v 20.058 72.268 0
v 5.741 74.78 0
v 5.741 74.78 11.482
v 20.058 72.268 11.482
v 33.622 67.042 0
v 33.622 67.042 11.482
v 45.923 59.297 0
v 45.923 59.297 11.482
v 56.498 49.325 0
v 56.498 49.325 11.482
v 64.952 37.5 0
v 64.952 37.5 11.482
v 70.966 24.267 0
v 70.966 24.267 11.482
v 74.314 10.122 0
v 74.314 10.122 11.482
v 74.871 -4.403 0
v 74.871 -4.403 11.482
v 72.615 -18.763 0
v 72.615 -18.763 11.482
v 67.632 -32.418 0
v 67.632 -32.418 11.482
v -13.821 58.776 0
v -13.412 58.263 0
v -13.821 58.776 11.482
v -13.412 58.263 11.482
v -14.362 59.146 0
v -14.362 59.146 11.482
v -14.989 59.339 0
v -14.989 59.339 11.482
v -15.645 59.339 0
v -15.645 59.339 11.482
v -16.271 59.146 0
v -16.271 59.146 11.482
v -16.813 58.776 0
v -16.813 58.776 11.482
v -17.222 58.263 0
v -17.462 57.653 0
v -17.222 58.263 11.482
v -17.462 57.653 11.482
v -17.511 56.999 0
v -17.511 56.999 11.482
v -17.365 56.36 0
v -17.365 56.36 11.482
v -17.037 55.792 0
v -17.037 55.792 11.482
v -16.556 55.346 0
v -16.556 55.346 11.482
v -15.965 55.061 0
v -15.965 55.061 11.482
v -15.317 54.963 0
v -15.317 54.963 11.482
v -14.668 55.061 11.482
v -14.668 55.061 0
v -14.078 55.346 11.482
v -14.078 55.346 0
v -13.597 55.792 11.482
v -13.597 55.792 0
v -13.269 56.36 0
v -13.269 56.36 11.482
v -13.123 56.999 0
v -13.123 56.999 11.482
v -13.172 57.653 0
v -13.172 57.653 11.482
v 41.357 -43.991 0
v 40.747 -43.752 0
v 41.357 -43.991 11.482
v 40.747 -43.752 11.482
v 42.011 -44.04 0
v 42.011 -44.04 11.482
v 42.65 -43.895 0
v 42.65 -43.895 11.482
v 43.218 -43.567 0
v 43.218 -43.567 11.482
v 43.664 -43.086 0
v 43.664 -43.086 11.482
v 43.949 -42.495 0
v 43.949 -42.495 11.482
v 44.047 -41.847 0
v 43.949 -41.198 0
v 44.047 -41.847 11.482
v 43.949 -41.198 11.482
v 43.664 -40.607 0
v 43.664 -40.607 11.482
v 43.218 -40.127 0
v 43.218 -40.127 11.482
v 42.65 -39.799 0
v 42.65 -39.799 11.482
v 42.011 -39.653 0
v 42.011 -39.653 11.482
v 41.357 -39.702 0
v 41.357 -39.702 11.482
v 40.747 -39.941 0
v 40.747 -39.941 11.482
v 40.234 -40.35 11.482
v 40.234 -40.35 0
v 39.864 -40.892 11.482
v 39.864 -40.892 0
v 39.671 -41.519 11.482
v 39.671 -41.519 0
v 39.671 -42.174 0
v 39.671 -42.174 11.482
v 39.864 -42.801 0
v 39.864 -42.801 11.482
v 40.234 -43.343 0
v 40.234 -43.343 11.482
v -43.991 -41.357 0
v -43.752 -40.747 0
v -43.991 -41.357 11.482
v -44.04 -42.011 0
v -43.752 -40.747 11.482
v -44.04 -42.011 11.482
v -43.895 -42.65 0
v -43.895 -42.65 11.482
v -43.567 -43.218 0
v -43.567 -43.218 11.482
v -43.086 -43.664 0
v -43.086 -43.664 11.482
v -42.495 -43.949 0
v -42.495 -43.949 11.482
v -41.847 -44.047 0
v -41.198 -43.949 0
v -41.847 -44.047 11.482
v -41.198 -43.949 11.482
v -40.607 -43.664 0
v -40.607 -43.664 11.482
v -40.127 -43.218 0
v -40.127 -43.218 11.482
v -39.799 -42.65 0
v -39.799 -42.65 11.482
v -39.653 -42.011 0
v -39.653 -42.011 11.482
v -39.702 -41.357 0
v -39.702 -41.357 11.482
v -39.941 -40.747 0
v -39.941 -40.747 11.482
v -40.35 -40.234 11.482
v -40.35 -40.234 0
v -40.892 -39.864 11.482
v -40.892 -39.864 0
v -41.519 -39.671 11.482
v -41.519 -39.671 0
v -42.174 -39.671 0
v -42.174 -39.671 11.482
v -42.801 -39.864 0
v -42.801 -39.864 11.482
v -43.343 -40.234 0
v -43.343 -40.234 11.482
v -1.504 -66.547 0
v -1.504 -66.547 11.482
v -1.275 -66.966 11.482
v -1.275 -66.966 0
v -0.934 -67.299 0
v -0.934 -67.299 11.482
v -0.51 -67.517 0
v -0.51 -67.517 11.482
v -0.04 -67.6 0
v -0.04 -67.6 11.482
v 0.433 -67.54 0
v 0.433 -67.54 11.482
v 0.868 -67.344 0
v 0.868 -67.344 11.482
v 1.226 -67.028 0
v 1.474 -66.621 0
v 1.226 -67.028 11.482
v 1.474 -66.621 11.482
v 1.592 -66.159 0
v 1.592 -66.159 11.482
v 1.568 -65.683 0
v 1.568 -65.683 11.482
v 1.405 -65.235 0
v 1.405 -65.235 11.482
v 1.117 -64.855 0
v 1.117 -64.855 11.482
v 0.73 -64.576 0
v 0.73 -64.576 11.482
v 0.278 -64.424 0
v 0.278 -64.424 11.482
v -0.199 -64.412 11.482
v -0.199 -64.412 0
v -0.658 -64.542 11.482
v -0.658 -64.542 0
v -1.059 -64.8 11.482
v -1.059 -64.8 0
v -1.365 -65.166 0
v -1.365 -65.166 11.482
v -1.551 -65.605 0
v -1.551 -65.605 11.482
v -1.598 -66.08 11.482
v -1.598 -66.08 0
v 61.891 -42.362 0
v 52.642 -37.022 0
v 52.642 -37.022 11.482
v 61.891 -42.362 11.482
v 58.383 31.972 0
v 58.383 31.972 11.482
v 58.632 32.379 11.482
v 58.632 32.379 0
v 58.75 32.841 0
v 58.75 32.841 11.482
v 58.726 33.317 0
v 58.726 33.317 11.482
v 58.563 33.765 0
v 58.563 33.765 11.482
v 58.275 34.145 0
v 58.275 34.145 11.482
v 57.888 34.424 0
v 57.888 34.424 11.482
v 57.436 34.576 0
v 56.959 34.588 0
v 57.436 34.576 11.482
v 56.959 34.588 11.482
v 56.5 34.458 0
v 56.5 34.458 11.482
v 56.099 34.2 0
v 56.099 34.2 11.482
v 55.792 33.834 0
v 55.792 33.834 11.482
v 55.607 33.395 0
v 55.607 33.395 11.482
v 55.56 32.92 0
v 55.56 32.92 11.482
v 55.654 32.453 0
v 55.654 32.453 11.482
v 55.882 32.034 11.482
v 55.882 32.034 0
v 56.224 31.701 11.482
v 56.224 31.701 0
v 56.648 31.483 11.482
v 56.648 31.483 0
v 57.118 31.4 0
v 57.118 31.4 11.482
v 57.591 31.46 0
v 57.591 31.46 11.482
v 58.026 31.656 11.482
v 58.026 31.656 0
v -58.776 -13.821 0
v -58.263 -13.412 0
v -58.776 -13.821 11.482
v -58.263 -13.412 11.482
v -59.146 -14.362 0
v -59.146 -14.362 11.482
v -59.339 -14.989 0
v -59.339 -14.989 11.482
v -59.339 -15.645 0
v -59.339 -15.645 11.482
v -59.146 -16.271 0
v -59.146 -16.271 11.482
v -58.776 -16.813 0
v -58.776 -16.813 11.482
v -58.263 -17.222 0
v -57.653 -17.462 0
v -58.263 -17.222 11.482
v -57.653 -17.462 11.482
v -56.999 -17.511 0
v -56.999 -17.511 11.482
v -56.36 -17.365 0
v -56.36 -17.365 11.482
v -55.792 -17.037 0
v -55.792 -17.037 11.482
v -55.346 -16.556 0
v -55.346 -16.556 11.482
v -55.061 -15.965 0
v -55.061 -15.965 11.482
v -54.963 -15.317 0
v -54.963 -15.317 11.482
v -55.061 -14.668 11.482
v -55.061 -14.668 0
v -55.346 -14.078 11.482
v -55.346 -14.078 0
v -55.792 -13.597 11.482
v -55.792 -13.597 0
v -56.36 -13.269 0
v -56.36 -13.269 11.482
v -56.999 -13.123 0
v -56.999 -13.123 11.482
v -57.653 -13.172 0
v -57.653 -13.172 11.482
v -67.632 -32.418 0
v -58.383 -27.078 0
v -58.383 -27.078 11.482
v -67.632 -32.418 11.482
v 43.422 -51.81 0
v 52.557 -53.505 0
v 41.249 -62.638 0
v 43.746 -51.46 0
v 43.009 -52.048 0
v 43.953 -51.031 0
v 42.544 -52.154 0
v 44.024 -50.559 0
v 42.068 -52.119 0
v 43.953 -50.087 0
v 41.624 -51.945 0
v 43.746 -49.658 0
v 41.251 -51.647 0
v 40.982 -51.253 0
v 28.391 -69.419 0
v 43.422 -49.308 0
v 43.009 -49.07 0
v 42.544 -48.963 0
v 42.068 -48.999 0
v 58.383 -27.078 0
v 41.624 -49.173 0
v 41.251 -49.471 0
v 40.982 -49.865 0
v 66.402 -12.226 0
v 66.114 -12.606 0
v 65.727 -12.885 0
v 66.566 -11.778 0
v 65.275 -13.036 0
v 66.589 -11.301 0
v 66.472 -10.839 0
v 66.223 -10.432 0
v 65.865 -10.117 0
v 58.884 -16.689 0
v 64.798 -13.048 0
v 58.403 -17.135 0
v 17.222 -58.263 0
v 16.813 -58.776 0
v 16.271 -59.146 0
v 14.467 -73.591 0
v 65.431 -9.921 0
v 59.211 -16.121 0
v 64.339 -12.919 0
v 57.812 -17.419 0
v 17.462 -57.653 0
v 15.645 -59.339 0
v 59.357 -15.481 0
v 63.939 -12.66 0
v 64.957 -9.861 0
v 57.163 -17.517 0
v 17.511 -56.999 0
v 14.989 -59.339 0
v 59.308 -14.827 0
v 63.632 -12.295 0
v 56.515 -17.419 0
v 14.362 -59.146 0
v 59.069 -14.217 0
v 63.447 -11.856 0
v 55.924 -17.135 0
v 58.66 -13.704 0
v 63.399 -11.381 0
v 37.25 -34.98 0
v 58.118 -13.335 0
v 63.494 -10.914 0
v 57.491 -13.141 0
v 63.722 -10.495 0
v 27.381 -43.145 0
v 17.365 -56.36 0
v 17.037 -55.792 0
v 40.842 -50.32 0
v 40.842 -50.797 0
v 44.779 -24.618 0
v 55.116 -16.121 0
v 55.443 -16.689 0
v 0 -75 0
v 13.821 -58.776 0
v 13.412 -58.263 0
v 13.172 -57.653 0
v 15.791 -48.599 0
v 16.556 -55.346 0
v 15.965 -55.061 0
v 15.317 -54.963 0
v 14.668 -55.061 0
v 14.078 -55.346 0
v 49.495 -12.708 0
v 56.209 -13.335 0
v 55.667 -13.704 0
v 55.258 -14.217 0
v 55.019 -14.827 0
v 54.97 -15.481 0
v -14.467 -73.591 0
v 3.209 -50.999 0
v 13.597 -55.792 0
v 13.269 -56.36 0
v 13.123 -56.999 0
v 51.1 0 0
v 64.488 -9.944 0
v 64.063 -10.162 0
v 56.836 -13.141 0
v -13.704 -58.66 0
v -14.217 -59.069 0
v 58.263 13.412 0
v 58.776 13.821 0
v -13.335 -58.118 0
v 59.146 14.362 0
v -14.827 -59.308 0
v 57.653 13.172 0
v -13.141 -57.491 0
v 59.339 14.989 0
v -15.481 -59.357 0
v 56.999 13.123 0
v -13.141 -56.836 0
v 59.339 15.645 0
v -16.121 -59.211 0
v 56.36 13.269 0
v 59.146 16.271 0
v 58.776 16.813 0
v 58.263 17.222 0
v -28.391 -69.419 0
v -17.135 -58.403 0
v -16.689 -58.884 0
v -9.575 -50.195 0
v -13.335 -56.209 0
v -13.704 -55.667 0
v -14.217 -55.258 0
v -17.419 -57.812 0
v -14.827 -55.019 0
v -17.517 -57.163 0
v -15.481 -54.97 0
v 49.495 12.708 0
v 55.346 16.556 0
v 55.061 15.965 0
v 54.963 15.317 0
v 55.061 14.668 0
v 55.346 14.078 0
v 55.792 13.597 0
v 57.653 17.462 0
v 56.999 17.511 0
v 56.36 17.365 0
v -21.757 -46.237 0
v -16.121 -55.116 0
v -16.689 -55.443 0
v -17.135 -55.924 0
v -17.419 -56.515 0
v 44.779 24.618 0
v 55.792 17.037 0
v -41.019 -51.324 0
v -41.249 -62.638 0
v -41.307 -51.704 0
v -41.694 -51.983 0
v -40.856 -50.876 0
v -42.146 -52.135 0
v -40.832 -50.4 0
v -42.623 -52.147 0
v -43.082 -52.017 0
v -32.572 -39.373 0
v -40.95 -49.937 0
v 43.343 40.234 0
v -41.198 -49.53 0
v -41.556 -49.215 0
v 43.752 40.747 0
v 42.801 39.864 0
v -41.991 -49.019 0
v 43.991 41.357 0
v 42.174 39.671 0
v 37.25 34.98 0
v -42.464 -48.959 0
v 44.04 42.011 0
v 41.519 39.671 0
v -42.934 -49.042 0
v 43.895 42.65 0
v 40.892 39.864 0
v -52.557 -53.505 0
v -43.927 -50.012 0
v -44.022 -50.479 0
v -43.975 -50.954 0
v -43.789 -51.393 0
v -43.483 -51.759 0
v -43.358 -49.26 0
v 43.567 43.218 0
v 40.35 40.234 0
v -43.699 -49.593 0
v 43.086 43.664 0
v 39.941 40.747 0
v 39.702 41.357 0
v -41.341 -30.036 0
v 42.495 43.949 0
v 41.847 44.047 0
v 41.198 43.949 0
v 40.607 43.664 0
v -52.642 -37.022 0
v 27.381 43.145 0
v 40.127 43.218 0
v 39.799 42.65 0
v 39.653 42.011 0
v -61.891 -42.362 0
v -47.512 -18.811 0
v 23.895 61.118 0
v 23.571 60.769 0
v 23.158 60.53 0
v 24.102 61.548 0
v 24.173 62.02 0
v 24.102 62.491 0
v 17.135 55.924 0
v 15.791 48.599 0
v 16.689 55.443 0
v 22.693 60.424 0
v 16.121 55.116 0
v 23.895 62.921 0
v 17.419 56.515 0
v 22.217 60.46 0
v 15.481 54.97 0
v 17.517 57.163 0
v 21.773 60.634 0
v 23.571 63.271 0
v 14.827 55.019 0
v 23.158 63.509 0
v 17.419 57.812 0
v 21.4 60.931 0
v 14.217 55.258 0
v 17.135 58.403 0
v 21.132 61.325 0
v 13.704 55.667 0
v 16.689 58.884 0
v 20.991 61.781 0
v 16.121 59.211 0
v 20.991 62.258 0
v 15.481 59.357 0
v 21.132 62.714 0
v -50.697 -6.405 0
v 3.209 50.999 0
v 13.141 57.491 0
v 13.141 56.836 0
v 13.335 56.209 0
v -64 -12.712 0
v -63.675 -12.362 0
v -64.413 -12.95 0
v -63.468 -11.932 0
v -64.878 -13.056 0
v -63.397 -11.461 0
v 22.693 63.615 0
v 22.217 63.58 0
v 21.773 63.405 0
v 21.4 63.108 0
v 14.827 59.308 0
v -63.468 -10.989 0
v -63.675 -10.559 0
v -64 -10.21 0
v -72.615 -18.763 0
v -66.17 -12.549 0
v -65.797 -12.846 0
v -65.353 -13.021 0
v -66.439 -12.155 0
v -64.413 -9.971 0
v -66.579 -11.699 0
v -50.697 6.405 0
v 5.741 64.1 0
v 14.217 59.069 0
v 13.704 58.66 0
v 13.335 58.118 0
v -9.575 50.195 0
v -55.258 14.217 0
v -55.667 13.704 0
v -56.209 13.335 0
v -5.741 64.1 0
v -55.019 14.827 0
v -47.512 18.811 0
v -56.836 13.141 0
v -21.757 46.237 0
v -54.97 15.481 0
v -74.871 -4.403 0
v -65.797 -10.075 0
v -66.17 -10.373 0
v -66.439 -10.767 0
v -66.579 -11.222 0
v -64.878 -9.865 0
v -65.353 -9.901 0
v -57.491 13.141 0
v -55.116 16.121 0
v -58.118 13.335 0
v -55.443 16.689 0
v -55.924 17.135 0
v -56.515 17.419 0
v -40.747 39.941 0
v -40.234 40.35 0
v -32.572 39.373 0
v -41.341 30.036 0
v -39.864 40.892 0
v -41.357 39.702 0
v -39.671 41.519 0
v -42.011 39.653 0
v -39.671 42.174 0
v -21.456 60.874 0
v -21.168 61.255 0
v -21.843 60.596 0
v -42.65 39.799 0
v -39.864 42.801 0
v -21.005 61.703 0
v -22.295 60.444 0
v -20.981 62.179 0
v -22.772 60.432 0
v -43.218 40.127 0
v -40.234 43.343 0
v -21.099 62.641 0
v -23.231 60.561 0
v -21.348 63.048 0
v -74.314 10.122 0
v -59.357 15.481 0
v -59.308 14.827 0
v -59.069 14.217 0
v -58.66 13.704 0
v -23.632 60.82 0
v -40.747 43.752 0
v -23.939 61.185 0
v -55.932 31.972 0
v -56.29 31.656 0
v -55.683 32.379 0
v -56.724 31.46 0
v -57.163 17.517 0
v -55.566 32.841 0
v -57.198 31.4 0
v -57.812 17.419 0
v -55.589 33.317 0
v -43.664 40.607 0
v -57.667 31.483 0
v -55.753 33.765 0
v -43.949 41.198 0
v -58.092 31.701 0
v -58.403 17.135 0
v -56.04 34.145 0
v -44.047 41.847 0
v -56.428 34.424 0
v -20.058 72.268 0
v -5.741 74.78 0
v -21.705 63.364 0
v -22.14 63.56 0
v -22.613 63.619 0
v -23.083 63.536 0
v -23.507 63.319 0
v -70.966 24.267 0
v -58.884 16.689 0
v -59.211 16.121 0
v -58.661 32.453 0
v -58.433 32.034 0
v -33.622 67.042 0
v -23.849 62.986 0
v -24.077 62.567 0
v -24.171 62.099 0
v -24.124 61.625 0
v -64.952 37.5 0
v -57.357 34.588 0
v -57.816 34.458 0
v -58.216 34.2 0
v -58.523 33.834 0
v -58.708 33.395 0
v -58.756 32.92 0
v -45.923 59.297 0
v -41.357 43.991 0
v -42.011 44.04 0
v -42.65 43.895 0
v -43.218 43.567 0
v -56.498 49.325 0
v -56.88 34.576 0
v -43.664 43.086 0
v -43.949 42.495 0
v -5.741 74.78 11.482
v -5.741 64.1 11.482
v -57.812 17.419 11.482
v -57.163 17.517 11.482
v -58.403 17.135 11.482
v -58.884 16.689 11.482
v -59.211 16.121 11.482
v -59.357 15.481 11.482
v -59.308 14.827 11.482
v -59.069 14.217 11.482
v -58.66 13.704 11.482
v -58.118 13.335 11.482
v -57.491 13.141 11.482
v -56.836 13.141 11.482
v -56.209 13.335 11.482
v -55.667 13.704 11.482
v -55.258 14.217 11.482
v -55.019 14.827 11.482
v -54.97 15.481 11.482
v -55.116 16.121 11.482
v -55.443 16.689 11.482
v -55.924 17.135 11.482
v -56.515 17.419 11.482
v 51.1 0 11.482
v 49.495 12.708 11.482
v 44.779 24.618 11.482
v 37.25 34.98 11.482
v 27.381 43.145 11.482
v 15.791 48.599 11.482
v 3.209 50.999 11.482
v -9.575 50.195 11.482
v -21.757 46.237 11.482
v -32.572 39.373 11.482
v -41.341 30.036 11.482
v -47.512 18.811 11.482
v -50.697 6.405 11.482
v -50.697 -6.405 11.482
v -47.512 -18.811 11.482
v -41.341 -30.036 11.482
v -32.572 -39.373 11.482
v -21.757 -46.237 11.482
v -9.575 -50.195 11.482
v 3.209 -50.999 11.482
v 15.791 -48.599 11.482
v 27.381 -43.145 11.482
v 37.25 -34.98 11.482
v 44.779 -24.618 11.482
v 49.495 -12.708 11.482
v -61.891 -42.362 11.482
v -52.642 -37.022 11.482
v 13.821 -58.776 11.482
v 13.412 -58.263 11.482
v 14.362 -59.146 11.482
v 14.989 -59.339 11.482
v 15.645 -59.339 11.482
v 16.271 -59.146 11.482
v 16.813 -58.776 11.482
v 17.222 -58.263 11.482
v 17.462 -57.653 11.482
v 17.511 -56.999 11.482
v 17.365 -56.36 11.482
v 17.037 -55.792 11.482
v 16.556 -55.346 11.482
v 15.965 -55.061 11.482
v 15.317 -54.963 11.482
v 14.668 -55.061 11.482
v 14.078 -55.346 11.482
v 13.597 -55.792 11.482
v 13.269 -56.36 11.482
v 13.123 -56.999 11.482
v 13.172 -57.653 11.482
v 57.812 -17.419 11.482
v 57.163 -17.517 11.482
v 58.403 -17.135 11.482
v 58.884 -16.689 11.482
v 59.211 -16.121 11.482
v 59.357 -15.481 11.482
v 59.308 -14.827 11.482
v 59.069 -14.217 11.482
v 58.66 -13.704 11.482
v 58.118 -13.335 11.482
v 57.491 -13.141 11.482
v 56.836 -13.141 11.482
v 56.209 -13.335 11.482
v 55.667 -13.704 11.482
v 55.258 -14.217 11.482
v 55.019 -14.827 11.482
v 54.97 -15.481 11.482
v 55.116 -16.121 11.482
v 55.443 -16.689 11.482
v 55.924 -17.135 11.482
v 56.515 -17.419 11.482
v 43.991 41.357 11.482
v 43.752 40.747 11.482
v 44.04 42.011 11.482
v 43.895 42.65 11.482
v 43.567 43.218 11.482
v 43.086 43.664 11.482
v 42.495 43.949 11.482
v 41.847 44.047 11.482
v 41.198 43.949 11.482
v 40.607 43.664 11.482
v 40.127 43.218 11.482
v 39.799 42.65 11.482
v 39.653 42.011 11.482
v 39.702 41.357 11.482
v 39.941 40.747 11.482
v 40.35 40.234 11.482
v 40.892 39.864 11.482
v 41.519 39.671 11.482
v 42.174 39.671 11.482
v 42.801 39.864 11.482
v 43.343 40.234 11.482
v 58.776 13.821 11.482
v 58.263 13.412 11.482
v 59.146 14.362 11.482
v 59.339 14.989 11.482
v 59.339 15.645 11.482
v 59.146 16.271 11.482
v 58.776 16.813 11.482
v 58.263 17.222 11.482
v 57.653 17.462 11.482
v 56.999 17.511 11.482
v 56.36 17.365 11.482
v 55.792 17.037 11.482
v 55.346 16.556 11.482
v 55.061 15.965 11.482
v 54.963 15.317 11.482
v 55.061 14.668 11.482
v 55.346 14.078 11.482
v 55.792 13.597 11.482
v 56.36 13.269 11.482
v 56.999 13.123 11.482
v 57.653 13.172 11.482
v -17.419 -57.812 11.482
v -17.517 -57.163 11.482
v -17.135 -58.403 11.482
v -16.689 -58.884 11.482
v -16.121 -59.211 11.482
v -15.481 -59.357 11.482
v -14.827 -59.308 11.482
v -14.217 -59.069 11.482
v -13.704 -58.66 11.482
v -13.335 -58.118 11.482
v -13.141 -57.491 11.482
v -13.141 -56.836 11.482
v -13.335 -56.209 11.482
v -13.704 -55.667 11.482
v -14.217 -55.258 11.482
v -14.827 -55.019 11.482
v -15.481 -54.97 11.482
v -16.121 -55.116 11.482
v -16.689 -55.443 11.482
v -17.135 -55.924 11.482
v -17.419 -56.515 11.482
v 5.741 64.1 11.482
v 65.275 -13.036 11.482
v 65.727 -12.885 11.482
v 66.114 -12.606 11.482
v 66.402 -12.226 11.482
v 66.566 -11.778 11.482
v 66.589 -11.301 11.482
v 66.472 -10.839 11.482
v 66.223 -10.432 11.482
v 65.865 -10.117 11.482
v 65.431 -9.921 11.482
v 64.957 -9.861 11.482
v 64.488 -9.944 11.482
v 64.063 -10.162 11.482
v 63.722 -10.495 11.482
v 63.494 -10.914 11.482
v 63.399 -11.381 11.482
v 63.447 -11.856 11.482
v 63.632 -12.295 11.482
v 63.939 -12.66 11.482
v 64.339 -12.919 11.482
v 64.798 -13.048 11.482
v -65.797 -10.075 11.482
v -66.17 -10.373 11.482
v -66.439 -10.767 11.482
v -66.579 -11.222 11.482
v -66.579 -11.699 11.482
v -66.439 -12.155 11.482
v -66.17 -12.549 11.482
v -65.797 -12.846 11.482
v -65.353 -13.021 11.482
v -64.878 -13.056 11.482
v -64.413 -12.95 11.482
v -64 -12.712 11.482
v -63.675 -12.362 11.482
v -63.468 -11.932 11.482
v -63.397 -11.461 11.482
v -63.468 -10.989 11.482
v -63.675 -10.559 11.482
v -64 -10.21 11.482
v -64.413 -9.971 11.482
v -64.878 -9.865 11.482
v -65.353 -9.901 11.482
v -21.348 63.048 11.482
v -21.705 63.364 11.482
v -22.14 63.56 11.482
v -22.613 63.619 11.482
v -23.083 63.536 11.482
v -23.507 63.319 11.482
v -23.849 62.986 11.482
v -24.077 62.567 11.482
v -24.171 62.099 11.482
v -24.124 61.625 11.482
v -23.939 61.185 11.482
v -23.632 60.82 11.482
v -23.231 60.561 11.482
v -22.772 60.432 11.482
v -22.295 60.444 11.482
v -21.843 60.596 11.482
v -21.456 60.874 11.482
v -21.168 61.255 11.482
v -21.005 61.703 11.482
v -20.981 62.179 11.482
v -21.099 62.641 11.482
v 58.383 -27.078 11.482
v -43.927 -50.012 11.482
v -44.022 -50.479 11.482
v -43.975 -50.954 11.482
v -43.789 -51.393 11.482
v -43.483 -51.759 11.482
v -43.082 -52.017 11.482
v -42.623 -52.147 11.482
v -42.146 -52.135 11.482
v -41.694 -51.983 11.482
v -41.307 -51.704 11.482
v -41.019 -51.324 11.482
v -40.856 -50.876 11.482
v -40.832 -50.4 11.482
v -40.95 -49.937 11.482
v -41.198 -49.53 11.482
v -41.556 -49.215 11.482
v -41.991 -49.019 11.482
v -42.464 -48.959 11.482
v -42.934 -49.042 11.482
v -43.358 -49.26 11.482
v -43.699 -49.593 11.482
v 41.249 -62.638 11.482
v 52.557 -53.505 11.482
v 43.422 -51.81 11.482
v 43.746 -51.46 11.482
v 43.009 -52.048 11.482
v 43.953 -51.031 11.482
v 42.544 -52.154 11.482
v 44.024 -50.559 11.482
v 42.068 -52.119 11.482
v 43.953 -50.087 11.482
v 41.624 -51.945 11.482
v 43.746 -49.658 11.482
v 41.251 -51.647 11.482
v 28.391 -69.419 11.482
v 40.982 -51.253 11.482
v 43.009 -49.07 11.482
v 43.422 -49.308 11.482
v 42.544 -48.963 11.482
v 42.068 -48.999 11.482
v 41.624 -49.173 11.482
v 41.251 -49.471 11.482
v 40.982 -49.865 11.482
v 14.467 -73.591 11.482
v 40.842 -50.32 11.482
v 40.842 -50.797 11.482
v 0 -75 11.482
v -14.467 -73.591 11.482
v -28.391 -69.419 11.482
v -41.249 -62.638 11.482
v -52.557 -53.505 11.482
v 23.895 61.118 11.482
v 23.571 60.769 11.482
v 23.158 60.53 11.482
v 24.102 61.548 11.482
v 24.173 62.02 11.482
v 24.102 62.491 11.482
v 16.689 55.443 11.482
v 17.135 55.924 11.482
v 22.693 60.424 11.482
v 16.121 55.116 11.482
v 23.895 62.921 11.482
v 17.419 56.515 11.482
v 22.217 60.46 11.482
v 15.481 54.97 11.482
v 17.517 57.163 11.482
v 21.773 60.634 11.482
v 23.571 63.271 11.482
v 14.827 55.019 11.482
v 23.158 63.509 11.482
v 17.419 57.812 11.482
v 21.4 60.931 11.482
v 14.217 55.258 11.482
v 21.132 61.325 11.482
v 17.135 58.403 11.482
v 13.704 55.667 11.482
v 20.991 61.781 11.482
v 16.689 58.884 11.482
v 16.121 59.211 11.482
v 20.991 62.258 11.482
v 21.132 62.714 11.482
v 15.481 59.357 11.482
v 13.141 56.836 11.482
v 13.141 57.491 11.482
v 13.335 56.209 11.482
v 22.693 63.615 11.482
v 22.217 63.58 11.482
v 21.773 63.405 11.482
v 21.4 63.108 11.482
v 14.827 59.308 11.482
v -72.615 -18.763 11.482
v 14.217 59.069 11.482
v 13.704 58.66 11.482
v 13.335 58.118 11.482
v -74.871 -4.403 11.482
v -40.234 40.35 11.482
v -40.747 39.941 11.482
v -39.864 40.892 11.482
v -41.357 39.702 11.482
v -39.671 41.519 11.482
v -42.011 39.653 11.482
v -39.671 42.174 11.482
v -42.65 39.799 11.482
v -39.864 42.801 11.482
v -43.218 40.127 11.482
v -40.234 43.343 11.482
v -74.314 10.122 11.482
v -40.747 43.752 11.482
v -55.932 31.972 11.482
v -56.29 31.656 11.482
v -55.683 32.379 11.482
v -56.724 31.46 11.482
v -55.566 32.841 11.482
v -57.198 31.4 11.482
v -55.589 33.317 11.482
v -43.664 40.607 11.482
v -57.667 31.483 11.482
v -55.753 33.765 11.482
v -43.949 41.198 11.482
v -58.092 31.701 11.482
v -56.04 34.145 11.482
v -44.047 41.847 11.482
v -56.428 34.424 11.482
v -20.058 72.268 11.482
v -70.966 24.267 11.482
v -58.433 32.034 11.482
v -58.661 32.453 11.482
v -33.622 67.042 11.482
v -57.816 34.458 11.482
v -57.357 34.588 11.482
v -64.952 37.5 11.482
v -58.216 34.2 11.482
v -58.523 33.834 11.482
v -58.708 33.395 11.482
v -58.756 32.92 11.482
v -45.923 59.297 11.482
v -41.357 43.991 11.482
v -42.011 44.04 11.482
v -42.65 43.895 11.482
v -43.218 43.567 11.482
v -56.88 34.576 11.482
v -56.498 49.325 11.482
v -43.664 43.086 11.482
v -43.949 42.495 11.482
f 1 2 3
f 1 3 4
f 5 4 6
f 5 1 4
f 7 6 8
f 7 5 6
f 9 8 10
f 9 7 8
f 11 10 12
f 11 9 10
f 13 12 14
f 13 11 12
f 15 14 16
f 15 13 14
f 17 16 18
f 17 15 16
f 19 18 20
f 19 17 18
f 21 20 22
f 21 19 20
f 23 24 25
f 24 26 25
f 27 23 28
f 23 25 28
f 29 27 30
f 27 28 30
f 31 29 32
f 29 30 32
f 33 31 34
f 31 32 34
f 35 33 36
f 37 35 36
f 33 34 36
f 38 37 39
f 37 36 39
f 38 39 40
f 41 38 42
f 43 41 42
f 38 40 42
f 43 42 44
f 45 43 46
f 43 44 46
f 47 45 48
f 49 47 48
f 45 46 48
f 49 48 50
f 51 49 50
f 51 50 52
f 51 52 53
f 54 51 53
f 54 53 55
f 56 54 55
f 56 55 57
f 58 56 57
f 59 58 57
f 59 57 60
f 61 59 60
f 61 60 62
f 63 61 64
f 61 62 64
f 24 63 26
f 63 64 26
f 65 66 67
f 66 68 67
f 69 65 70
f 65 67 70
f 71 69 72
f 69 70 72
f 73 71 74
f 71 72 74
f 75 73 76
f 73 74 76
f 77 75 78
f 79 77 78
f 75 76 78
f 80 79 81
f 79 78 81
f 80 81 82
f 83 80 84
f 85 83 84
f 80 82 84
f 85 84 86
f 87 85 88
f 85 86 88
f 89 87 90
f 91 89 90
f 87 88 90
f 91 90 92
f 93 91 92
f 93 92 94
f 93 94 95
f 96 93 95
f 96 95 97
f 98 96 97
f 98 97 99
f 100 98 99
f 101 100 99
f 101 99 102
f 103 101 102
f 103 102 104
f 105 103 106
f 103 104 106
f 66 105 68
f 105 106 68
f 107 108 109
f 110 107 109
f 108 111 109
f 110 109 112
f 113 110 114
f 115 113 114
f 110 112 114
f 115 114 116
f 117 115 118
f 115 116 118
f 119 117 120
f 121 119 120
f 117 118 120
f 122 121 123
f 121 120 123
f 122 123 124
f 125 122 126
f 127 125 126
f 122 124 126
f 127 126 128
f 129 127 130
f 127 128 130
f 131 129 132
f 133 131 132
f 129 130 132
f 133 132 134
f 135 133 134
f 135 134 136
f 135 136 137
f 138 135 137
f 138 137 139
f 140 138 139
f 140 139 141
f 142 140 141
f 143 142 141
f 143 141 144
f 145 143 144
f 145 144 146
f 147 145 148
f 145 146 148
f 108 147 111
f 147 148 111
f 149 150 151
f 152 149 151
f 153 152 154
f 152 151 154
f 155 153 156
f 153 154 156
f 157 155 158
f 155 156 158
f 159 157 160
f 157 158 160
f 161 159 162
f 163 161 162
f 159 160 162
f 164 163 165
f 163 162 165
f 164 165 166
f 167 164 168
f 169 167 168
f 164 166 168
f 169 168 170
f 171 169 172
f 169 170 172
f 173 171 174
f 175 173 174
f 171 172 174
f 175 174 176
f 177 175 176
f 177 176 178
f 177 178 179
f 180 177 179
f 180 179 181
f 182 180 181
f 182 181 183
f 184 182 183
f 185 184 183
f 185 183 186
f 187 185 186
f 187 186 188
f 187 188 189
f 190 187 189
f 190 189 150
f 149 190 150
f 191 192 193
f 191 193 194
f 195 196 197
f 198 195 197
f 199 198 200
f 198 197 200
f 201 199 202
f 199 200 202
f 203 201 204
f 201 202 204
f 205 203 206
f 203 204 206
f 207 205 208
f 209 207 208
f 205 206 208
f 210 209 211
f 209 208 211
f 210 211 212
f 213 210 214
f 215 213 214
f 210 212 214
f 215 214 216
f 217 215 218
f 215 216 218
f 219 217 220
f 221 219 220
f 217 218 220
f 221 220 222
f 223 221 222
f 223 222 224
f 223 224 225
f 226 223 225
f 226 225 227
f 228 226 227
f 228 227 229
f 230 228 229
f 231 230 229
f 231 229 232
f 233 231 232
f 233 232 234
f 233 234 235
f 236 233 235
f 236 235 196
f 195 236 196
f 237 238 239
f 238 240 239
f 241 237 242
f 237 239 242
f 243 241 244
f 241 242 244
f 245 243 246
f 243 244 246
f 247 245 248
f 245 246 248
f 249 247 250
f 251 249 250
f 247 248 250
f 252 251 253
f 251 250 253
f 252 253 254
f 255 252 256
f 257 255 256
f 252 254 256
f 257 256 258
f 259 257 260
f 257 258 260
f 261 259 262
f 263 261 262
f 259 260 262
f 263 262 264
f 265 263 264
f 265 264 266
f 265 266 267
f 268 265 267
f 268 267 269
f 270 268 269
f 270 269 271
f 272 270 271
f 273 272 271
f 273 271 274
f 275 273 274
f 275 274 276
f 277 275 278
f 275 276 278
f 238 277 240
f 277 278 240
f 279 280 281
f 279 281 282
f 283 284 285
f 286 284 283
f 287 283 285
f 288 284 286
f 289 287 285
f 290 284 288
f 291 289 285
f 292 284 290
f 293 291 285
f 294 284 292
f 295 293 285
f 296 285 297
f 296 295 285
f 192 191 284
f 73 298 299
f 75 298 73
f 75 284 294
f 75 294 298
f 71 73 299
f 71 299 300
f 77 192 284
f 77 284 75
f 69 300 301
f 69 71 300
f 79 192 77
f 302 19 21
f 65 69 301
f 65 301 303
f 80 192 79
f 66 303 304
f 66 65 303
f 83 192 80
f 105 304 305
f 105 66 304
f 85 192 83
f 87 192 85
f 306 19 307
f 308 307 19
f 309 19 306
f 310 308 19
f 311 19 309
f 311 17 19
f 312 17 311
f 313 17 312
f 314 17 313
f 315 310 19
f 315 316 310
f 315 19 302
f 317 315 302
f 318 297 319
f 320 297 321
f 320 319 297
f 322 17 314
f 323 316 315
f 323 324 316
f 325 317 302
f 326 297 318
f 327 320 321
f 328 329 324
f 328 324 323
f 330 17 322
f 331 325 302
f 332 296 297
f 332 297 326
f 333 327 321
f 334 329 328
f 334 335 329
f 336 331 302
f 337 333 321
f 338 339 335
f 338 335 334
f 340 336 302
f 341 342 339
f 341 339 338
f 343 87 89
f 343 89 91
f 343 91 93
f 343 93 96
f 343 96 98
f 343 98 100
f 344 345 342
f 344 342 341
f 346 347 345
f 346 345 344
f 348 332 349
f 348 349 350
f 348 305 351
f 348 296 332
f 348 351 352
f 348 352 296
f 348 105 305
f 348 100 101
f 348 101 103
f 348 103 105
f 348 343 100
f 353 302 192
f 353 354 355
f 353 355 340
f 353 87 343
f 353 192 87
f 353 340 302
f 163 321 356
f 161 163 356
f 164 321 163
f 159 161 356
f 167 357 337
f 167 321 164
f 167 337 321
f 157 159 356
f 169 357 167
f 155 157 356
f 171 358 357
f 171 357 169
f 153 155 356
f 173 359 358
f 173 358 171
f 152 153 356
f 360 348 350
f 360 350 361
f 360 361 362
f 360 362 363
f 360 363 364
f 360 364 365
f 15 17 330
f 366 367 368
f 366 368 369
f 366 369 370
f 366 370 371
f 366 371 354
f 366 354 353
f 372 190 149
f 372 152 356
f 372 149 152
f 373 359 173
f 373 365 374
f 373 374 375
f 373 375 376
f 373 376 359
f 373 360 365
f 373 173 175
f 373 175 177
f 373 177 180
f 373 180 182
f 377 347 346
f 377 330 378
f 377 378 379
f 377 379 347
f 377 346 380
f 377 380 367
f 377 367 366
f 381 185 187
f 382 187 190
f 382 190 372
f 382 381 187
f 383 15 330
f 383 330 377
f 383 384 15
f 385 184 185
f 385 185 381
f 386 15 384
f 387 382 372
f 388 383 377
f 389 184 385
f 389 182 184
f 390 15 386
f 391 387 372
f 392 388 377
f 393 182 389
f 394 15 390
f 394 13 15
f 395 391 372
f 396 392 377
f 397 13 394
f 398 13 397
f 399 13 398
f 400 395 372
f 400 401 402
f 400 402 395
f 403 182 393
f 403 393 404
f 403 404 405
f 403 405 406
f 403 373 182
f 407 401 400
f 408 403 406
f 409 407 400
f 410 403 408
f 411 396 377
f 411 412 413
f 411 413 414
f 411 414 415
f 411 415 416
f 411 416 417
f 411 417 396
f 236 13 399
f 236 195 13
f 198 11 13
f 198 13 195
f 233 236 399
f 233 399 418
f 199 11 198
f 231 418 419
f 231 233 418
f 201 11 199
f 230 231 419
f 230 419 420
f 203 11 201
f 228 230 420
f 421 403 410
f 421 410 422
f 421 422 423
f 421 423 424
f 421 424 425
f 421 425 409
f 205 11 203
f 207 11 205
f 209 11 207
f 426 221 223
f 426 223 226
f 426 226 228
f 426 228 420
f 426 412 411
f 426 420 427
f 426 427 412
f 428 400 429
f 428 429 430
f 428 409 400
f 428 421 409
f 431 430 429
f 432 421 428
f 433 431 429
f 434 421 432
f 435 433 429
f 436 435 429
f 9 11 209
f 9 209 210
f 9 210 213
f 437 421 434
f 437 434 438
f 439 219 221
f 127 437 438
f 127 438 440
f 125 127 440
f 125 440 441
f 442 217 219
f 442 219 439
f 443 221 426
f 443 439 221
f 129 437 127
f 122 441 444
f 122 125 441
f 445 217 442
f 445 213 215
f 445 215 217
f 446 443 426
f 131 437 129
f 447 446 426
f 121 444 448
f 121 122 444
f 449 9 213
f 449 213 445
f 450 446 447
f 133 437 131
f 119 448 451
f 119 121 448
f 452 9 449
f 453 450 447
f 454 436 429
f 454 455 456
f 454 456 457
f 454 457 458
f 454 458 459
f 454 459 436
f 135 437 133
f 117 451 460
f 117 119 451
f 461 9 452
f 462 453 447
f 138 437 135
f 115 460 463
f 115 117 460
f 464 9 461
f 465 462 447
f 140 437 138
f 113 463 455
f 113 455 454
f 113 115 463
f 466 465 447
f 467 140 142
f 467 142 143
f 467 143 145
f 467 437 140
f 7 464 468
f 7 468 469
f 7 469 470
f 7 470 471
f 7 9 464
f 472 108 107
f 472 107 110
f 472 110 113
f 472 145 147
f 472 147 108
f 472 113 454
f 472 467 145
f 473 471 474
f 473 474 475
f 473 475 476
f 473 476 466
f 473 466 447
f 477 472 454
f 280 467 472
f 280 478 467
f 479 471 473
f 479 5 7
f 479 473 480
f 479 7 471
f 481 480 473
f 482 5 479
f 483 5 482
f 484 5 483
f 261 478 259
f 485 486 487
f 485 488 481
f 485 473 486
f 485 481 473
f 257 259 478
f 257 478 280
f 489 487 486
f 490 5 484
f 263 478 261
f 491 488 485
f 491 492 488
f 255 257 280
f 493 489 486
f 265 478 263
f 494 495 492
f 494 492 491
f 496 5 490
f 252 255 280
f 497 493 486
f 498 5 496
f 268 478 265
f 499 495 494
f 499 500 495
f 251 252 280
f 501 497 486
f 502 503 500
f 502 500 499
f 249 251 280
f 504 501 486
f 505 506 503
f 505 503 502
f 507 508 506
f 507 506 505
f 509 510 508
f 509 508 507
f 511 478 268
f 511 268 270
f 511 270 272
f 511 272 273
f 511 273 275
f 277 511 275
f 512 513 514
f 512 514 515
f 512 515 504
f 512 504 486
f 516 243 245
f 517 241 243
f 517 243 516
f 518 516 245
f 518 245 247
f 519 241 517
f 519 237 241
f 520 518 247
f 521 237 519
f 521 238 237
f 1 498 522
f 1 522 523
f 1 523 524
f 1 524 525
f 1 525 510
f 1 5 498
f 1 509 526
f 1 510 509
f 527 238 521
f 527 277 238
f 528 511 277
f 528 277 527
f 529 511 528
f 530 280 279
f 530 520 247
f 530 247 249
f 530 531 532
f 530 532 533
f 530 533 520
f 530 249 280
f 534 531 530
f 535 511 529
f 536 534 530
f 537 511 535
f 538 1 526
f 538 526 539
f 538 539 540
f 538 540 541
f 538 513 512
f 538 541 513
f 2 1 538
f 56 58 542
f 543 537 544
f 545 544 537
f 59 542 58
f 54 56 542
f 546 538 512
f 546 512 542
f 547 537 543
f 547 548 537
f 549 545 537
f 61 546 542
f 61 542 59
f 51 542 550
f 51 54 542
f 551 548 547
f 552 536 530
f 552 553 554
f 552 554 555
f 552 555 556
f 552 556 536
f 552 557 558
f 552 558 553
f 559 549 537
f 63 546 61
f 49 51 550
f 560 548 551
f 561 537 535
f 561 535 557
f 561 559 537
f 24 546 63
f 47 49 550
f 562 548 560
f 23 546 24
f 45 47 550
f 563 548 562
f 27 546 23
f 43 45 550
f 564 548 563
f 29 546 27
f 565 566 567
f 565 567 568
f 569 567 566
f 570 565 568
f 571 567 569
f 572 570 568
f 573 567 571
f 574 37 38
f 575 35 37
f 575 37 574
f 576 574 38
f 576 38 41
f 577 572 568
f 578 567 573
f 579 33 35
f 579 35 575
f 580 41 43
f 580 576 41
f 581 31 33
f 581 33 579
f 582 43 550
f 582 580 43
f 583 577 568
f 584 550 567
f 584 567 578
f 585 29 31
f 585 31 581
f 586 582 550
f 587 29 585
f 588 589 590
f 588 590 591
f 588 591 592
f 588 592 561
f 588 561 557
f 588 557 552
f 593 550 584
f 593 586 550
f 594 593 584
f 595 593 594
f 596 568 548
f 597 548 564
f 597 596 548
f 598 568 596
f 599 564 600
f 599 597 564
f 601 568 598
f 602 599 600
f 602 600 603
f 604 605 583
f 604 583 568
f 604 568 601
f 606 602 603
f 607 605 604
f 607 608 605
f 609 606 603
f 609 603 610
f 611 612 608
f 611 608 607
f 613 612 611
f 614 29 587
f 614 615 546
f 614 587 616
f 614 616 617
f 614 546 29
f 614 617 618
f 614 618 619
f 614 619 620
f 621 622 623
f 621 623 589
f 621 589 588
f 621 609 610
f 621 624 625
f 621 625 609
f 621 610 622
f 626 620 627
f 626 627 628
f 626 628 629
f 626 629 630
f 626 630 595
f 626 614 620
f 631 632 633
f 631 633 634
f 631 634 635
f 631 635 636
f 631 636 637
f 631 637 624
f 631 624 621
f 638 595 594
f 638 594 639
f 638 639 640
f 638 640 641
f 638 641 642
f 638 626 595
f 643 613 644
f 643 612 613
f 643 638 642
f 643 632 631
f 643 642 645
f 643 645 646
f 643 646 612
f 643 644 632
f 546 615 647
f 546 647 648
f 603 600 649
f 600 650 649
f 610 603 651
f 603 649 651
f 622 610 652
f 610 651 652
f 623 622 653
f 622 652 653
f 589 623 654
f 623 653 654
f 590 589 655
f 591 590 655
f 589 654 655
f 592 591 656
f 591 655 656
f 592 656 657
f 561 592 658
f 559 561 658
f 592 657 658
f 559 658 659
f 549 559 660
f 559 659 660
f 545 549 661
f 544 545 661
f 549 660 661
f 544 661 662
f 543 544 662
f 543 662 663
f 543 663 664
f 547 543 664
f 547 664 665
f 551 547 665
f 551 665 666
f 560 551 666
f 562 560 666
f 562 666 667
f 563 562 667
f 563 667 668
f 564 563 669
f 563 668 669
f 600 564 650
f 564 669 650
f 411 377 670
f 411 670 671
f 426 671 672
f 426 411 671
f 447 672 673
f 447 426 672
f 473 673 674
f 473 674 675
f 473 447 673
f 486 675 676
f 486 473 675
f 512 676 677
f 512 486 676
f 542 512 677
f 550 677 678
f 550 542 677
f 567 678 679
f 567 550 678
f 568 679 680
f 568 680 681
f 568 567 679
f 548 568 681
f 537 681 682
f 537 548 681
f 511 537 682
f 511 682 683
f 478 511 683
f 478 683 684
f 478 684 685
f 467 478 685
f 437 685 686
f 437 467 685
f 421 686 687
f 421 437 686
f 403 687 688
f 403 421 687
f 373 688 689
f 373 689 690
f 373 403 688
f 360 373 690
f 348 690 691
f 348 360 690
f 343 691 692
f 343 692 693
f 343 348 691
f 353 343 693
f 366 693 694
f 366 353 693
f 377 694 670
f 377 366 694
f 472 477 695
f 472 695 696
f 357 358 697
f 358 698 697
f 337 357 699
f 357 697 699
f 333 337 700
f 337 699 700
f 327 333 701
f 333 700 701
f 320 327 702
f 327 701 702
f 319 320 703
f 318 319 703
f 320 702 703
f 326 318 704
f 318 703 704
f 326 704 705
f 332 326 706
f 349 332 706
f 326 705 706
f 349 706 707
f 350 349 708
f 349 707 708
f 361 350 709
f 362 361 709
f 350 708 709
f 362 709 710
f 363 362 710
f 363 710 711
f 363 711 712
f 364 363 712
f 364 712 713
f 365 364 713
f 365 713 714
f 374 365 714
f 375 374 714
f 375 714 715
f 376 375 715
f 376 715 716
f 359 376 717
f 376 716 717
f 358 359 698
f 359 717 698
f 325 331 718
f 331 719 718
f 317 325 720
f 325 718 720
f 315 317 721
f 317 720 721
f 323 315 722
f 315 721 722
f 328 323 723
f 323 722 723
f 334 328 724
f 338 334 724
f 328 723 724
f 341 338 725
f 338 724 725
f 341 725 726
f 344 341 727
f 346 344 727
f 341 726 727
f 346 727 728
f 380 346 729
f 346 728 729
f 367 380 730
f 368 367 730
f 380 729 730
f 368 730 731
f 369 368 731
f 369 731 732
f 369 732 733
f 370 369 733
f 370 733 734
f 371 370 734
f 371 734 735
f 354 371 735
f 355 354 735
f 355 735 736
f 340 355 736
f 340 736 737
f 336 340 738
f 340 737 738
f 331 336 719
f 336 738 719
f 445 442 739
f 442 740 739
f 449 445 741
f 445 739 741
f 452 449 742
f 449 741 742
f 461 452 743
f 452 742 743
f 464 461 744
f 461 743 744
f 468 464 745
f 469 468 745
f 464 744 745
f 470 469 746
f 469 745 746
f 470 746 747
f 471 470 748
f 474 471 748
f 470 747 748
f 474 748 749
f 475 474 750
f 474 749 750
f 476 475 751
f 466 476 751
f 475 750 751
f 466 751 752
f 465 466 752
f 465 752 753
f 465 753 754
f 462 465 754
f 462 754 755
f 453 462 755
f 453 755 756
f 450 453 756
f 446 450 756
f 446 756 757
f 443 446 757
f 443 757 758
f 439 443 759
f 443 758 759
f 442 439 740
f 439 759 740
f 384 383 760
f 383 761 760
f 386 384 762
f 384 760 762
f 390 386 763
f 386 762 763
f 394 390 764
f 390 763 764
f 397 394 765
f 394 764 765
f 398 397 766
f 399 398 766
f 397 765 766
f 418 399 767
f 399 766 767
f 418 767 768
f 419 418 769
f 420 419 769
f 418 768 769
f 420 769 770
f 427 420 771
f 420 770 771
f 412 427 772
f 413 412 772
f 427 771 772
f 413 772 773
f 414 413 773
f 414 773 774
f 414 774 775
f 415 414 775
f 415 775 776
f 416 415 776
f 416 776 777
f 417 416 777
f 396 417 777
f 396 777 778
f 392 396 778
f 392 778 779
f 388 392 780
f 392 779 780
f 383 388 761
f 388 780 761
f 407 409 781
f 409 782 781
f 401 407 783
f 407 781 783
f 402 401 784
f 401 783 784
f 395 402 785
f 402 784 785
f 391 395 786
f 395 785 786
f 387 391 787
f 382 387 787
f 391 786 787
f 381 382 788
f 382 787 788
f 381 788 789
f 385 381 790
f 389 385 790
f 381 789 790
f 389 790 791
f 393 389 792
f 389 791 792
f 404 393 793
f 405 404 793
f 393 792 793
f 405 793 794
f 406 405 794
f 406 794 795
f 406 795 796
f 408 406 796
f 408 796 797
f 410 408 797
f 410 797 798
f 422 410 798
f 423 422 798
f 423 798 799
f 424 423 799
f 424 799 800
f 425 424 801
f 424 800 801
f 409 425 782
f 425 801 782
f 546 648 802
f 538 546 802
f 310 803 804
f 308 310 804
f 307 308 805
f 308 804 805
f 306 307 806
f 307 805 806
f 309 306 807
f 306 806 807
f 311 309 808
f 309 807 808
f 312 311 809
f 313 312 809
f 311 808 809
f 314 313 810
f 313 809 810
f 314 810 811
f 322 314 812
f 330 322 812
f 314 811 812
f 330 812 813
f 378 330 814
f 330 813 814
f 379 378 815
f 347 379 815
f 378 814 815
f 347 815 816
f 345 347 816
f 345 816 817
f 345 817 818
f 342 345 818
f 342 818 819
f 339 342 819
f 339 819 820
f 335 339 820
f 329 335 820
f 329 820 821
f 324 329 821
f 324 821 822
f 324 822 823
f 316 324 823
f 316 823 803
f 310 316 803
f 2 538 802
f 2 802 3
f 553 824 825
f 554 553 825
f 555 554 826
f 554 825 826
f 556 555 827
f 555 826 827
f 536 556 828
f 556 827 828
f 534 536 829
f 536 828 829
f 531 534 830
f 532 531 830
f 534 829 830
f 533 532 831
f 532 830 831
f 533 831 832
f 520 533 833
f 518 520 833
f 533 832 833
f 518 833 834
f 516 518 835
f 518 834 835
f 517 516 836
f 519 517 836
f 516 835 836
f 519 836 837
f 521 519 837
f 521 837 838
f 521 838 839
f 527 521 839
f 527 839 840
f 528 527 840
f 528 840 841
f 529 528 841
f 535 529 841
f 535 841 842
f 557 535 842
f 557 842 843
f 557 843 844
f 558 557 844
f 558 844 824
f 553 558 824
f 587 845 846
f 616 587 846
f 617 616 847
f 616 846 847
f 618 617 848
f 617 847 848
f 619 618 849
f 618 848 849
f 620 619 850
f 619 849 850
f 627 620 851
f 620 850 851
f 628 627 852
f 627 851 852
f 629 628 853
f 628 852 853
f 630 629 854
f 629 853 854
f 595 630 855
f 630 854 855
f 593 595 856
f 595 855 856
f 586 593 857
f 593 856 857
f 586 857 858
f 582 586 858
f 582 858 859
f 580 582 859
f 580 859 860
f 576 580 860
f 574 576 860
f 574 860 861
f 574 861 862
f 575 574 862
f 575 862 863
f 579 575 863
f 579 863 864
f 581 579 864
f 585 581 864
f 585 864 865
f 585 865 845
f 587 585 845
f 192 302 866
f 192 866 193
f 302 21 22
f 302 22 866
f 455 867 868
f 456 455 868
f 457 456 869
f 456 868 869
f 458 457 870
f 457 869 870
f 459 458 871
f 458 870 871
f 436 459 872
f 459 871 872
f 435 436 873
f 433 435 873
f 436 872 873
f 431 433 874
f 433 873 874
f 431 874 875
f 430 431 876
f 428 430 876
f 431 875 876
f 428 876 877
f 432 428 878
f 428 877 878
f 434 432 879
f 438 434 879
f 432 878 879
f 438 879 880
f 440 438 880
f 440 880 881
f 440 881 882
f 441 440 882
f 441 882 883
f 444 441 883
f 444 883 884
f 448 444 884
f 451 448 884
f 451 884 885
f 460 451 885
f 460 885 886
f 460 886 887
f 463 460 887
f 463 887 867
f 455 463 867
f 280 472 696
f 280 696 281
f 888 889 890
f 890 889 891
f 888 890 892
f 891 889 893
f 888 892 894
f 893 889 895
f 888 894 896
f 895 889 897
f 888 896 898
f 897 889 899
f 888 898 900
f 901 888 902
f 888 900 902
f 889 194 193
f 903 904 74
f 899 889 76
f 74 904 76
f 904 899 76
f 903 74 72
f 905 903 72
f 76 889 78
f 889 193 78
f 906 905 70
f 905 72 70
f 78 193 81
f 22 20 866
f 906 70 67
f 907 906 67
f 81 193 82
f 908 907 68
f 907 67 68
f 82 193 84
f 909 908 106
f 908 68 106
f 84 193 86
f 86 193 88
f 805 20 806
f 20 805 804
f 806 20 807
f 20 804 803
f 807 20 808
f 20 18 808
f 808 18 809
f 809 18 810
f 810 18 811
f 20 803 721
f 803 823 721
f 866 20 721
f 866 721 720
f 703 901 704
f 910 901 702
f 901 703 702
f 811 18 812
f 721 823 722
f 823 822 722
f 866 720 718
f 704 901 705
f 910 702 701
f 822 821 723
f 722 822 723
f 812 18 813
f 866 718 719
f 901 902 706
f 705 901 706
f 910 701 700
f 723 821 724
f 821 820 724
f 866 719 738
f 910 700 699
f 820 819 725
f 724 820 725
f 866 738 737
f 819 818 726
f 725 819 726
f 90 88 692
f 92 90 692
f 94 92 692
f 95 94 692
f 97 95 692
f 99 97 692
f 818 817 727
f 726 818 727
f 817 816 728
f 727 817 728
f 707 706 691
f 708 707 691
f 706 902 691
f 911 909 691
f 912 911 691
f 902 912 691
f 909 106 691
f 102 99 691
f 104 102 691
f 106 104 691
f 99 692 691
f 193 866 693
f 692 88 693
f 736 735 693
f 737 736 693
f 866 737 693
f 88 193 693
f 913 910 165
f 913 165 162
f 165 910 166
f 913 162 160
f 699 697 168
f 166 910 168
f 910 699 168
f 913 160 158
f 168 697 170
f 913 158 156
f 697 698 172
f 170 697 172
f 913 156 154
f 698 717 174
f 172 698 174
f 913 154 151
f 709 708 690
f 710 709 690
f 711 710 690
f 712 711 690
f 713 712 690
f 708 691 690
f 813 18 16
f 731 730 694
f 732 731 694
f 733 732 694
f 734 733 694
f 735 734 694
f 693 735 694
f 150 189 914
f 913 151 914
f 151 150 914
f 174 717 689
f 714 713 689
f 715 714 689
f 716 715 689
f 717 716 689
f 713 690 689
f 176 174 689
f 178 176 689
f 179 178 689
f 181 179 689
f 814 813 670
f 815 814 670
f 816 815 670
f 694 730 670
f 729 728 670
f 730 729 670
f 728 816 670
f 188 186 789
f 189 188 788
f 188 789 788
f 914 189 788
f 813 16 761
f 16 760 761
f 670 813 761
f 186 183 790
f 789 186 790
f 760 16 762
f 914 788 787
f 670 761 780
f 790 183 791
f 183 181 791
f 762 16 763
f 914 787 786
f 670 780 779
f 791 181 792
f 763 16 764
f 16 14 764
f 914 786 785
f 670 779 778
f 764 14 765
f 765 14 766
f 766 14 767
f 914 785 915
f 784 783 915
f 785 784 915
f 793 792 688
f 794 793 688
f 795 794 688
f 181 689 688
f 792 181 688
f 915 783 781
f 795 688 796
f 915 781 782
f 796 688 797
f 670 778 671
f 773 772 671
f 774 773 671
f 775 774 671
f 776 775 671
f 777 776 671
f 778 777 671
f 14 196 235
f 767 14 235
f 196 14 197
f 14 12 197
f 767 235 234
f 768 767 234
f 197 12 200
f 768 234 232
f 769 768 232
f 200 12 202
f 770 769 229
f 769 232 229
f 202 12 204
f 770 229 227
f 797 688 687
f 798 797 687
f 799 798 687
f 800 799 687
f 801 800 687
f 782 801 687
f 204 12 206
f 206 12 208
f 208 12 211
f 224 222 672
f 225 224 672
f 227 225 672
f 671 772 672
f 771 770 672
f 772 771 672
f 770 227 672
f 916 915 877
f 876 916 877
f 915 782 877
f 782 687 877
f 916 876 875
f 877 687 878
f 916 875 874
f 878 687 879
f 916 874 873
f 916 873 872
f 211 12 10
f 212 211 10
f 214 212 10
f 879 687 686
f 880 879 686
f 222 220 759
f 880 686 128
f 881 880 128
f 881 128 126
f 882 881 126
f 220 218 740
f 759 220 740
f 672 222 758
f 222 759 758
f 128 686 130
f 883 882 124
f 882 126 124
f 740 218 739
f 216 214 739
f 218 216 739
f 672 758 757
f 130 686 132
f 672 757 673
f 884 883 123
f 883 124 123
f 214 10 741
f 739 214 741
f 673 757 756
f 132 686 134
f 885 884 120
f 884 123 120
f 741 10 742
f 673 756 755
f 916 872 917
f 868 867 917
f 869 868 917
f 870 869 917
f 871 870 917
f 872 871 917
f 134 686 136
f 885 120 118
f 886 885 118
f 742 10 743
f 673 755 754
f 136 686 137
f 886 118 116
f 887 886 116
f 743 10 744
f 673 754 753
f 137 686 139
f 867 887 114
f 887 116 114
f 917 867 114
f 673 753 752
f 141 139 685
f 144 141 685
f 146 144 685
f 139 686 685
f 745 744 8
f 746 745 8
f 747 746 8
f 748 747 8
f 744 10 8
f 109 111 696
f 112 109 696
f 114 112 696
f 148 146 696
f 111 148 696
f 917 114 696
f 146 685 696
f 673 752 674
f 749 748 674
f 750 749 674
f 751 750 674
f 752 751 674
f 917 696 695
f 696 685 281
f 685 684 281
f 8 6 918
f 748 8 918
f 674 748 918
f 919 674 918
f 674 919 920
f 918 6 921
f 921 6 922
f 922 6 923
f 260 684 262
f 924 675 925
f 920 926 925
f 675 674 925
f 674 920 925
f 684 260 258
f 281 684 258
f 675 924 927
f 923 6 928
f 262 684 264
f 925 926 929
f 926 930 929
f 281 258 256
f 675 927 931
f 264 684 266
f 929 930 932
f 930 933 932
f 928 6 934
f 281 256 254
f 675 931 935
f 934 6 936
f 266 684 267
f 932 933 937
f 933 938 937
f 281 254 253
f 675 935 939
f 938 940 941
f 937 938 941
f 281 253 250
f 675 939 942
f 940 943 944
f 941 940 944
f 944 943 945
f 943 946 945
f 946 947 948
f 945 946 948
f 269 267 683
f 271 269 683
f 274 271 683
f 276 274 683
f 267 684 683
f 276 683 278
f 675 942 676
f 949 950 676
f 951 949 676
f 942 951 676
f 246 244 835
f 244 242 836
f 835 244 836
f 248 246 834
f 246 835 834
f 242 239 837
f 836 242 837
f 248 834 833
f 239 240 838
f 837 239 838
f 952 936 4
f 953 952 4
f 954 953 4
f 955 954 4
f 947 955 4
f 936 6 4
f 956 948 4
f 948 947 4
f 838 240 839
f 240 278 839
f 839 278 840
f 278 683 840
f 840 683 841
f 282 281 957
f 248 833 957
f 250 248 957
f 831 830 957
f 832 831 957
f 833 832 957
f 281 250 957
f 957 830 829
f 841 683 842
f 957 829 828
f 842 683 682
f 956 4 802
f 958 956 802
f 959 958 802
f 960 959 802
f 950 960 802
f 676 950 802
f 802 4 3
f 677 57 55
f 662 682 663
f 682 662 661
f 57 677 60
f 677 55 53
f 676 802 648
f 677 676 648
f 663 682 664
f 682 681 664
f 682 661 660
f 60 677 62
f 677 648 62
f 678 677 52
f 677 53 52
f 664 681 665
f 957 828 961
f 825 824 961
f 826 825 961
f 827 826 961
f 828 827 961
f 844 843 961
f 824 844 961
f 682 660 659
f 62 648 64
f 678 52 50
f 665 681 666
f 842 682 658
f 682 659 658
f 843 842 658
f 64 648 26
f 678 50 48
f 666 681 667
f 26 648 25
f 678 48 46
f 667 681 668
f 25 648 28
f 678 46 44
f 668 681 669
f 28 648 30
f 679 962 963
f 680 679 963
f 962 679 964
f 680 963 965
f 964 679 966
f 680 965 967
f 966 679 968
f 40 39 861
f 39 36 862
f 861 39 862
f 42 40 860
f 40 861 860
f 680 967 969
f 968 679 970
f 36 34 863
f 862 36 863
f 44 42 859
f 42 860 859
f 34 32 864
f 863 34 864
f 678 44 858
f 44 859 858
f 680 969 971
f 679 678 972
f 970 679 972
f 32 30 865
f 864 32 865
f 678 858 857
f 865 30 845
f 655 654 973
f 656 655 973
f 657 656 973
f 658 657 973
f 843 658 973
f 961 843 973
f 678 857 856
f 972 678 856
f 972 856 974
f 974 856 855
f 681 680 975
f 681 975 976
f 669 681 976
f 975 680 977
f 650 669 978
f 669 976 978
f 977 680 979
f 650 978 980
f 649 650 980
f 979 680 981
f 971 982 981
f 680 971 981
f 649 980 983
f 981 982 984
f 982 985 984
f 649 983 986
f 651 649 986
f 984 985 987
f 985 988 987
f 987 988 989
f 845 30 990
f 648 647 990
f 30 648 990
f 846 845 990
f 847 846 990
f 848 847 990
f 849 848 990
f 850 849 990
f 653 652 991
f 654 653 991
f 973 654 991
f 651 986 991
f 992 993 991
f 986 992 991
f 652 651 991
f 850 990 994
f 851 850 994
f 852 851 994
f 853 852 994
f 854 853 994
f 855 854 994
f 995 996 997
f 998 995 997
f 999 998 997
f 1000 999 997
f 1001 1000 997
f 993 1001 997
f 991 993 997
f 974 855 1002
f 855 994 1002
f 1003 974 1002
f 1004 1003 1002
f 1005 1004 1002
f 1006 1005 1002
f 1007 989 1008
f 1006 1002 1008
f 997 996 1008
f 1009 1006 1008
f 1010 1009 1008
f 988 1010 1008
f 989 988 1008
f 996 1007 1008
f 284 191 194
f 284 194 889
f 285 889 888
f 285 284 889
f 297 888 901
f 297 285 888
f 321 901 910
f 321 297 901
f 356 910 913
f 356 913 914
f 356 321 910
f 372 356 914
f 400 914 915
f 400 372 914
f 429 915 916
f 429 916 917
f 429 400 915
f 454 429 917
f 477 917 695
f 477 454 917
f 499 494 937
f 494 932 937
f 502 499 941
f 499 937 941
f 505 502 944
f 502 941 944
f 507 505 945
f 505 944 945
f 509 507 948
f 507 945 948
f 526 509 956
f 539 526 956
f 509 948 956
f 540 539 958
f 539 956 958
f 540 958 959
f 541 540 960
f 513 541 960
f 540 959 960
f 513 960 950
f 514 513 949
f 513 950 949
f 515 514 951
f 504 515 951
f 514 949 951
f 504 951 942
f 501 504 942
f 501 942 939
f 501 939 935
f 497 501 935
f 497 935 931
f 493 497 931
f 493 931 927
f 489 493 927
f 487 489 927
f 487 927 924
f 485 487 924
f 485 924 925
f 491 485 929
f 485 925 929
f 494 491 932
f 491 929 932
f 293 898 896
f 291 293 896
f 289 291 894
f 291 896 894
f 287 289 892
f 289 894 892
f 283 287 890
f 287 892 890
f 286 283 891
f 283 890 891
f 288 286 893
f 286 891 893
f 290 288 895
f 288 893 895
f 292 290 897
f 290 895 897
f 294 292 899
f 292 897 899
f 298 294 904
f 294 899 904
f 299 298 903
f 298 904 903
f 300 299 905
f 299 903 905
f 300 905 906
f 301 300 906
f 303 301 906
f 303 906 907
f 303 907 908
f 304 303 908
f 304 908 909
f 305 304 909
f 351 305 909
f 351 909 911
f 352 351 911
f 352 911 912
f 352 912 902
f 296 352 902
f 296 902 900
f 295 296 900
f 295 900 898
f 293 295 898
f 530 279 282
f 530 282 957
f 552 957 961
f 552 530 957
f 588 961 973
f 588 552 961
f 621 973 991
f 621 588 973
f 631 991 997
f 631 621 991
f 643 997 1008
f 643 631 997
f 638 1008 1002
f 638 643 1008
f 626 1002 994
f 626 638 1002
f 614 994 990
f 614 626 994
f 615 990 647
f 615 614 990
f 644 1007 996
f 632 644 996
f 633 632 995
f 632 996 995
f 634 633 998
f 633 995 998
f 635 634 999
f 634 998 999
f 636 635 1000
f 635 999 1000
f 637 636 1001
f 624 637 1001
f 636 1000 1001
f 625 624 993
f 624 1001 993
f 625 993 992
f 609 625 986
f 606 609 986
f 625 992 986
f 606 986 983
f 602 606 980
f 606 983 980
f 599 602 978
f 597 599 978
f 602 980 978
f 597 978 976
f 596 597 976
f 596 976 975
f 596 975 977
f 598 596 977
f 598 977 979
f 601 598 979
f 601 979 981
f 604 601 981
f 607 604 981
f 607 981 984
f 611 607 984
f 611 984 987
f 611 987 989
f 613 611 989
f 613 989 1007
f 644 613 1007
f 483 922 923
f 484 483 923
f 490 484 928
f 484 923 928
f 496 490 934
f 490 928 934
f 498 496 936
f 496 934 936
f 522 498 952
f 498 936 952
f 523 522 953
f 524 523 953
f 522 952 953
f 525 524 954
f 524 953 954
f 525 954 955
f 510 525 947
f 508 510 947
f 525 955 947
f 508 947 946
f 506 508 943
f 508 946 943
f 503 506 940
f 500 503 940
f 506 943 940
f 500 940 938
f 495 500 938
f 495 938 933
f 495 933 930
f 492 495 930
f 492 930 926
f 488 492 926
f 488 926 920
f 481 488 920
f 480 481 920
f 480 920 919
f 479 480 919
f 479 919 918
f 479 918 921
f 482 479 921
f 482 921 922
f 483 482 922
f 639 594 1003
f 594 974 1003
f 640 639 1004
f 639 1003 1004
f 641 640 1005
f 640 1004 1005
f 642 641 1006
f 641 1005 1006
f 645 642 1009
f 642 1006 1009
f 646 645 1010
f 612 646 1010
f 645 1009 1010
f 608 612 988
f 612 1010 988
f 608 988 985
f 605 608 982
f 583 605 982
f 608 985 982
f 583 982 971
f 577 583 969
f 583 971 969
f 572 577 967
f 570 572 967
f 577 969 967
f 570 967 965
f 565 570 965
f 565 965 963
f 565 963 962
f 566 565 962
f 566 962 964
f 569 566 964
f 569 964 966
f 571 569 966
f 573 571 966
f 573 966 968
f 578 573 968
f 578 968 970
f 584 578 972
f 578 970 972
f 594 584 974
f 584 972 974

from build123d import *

# Parameters (mm, degrees)
ESQUISSE1_R        = 51.1
BOSS_EXTRU_1_DEPTH = 11.482
SKETCH2_R          = 1.6
CUT_EXTRUDE1_DEPTH = 107.685689406
CIRPATTERN1_COUNT  = 9
SKETCH3_R          = 2.2
CUT_EXTRUDE2_DEPTH = 25
CIRPATTERN2_COUNT  = 12


with BuildPart() as part:
    # Esquisse1 → Boss.-Extru.1 (new body)
    with BuildSketch(Plane.XY):
        with BuildLine():
            Line((52.641728383, -37.021851843), (61.890836376, -42.361826833))
            ThreePointArc((61.890836376, -42.361826833), (0, -75), (-61.890836376, -42.361826833))
            Line((-61.890836376, -42.361826833), (-52.641728383, -37.021851843))
            Line((-52.641728383, -37.021851843), (-58.382728383, -27.078148157))
            Line((-58.382728383, -27.078148157), (-67.631836376, -32.418123147))
            ThreePointArc((-67.631836376, -32.418123147), (-64.951905284, 37.5), (-5.741, 74.77994998))
            Line((-5.741, 74.77994998), (-5.741, 64.1))
            Line((-5.741, 64.1), (5.741, 64.1))
            Line((5.741, 64.1), (5.741, 74.77994998))
            ThreePointArc((5.741, 74.77994998), (64.951905284, 37.5), (67.631836376, -32.418123147))
            Line((67.631836376, -32.418123147), (58.382728383, -27.078148157))
            Line((58.382728383, -27.078148157), (52.641728383, -37.021851843))
        make_face()
        Circle(ESQUISSE1_R, mode=Mode.SUBTRACT)
    extrude(amount=BOSS_EXTRU_1_DEPTH)

    # Sketch2 → Cut-Extrude1 (cut, through all)
    with BuildSketch(Plane.XY.offset(11.482)):
        with Locations((22.573329459, 62.019712972)):
            Circle(SKETCH2_R)
    cut_extrude1 = extrude(amount=-CUT_EXTRUDE1_DEPTH, mode=Mode.SUBTRACT)

    # CirPattern1: Cut-Extrude1 ×9 about axis
    cirpattern1_axis = Axis((0, 0, 0), (0, 0, 1))
    for i in range(1, CIRPATTERN1_COUNT):
        add(cut_extrude1.rotate(cirpattern1_axis, i * 360 / CIRPATTERN1_COUNT), mode=Mode.SUBTRACT)

    # Sketch3 → Cut-Extrude2 (cut, symmetric)
    with BuildSketch(Plane.XY):
        with Locations((15.316911089, 57.1634904)):
            Circle(SKETCH3_R)
    cut_extrude2 = extrude(amount=CUT_EXTRUDE2_DEPTH, both=True, mode=Mode.SUBTRACT)

    # CirPattern2: Cut-Extrude2 ×12 about axis
    cirpattern2_axis = Axis((0, 0, 0), (0, 0, 1))
    for i in range(1, CIRPATTERN2_COUNT):
        add(cut_extrude2.rotate(cirpattern2_axis, i * 360 / CIRPATTERN2_COUNT), mode=Mode.SUBTRACT)


solid = part.part
